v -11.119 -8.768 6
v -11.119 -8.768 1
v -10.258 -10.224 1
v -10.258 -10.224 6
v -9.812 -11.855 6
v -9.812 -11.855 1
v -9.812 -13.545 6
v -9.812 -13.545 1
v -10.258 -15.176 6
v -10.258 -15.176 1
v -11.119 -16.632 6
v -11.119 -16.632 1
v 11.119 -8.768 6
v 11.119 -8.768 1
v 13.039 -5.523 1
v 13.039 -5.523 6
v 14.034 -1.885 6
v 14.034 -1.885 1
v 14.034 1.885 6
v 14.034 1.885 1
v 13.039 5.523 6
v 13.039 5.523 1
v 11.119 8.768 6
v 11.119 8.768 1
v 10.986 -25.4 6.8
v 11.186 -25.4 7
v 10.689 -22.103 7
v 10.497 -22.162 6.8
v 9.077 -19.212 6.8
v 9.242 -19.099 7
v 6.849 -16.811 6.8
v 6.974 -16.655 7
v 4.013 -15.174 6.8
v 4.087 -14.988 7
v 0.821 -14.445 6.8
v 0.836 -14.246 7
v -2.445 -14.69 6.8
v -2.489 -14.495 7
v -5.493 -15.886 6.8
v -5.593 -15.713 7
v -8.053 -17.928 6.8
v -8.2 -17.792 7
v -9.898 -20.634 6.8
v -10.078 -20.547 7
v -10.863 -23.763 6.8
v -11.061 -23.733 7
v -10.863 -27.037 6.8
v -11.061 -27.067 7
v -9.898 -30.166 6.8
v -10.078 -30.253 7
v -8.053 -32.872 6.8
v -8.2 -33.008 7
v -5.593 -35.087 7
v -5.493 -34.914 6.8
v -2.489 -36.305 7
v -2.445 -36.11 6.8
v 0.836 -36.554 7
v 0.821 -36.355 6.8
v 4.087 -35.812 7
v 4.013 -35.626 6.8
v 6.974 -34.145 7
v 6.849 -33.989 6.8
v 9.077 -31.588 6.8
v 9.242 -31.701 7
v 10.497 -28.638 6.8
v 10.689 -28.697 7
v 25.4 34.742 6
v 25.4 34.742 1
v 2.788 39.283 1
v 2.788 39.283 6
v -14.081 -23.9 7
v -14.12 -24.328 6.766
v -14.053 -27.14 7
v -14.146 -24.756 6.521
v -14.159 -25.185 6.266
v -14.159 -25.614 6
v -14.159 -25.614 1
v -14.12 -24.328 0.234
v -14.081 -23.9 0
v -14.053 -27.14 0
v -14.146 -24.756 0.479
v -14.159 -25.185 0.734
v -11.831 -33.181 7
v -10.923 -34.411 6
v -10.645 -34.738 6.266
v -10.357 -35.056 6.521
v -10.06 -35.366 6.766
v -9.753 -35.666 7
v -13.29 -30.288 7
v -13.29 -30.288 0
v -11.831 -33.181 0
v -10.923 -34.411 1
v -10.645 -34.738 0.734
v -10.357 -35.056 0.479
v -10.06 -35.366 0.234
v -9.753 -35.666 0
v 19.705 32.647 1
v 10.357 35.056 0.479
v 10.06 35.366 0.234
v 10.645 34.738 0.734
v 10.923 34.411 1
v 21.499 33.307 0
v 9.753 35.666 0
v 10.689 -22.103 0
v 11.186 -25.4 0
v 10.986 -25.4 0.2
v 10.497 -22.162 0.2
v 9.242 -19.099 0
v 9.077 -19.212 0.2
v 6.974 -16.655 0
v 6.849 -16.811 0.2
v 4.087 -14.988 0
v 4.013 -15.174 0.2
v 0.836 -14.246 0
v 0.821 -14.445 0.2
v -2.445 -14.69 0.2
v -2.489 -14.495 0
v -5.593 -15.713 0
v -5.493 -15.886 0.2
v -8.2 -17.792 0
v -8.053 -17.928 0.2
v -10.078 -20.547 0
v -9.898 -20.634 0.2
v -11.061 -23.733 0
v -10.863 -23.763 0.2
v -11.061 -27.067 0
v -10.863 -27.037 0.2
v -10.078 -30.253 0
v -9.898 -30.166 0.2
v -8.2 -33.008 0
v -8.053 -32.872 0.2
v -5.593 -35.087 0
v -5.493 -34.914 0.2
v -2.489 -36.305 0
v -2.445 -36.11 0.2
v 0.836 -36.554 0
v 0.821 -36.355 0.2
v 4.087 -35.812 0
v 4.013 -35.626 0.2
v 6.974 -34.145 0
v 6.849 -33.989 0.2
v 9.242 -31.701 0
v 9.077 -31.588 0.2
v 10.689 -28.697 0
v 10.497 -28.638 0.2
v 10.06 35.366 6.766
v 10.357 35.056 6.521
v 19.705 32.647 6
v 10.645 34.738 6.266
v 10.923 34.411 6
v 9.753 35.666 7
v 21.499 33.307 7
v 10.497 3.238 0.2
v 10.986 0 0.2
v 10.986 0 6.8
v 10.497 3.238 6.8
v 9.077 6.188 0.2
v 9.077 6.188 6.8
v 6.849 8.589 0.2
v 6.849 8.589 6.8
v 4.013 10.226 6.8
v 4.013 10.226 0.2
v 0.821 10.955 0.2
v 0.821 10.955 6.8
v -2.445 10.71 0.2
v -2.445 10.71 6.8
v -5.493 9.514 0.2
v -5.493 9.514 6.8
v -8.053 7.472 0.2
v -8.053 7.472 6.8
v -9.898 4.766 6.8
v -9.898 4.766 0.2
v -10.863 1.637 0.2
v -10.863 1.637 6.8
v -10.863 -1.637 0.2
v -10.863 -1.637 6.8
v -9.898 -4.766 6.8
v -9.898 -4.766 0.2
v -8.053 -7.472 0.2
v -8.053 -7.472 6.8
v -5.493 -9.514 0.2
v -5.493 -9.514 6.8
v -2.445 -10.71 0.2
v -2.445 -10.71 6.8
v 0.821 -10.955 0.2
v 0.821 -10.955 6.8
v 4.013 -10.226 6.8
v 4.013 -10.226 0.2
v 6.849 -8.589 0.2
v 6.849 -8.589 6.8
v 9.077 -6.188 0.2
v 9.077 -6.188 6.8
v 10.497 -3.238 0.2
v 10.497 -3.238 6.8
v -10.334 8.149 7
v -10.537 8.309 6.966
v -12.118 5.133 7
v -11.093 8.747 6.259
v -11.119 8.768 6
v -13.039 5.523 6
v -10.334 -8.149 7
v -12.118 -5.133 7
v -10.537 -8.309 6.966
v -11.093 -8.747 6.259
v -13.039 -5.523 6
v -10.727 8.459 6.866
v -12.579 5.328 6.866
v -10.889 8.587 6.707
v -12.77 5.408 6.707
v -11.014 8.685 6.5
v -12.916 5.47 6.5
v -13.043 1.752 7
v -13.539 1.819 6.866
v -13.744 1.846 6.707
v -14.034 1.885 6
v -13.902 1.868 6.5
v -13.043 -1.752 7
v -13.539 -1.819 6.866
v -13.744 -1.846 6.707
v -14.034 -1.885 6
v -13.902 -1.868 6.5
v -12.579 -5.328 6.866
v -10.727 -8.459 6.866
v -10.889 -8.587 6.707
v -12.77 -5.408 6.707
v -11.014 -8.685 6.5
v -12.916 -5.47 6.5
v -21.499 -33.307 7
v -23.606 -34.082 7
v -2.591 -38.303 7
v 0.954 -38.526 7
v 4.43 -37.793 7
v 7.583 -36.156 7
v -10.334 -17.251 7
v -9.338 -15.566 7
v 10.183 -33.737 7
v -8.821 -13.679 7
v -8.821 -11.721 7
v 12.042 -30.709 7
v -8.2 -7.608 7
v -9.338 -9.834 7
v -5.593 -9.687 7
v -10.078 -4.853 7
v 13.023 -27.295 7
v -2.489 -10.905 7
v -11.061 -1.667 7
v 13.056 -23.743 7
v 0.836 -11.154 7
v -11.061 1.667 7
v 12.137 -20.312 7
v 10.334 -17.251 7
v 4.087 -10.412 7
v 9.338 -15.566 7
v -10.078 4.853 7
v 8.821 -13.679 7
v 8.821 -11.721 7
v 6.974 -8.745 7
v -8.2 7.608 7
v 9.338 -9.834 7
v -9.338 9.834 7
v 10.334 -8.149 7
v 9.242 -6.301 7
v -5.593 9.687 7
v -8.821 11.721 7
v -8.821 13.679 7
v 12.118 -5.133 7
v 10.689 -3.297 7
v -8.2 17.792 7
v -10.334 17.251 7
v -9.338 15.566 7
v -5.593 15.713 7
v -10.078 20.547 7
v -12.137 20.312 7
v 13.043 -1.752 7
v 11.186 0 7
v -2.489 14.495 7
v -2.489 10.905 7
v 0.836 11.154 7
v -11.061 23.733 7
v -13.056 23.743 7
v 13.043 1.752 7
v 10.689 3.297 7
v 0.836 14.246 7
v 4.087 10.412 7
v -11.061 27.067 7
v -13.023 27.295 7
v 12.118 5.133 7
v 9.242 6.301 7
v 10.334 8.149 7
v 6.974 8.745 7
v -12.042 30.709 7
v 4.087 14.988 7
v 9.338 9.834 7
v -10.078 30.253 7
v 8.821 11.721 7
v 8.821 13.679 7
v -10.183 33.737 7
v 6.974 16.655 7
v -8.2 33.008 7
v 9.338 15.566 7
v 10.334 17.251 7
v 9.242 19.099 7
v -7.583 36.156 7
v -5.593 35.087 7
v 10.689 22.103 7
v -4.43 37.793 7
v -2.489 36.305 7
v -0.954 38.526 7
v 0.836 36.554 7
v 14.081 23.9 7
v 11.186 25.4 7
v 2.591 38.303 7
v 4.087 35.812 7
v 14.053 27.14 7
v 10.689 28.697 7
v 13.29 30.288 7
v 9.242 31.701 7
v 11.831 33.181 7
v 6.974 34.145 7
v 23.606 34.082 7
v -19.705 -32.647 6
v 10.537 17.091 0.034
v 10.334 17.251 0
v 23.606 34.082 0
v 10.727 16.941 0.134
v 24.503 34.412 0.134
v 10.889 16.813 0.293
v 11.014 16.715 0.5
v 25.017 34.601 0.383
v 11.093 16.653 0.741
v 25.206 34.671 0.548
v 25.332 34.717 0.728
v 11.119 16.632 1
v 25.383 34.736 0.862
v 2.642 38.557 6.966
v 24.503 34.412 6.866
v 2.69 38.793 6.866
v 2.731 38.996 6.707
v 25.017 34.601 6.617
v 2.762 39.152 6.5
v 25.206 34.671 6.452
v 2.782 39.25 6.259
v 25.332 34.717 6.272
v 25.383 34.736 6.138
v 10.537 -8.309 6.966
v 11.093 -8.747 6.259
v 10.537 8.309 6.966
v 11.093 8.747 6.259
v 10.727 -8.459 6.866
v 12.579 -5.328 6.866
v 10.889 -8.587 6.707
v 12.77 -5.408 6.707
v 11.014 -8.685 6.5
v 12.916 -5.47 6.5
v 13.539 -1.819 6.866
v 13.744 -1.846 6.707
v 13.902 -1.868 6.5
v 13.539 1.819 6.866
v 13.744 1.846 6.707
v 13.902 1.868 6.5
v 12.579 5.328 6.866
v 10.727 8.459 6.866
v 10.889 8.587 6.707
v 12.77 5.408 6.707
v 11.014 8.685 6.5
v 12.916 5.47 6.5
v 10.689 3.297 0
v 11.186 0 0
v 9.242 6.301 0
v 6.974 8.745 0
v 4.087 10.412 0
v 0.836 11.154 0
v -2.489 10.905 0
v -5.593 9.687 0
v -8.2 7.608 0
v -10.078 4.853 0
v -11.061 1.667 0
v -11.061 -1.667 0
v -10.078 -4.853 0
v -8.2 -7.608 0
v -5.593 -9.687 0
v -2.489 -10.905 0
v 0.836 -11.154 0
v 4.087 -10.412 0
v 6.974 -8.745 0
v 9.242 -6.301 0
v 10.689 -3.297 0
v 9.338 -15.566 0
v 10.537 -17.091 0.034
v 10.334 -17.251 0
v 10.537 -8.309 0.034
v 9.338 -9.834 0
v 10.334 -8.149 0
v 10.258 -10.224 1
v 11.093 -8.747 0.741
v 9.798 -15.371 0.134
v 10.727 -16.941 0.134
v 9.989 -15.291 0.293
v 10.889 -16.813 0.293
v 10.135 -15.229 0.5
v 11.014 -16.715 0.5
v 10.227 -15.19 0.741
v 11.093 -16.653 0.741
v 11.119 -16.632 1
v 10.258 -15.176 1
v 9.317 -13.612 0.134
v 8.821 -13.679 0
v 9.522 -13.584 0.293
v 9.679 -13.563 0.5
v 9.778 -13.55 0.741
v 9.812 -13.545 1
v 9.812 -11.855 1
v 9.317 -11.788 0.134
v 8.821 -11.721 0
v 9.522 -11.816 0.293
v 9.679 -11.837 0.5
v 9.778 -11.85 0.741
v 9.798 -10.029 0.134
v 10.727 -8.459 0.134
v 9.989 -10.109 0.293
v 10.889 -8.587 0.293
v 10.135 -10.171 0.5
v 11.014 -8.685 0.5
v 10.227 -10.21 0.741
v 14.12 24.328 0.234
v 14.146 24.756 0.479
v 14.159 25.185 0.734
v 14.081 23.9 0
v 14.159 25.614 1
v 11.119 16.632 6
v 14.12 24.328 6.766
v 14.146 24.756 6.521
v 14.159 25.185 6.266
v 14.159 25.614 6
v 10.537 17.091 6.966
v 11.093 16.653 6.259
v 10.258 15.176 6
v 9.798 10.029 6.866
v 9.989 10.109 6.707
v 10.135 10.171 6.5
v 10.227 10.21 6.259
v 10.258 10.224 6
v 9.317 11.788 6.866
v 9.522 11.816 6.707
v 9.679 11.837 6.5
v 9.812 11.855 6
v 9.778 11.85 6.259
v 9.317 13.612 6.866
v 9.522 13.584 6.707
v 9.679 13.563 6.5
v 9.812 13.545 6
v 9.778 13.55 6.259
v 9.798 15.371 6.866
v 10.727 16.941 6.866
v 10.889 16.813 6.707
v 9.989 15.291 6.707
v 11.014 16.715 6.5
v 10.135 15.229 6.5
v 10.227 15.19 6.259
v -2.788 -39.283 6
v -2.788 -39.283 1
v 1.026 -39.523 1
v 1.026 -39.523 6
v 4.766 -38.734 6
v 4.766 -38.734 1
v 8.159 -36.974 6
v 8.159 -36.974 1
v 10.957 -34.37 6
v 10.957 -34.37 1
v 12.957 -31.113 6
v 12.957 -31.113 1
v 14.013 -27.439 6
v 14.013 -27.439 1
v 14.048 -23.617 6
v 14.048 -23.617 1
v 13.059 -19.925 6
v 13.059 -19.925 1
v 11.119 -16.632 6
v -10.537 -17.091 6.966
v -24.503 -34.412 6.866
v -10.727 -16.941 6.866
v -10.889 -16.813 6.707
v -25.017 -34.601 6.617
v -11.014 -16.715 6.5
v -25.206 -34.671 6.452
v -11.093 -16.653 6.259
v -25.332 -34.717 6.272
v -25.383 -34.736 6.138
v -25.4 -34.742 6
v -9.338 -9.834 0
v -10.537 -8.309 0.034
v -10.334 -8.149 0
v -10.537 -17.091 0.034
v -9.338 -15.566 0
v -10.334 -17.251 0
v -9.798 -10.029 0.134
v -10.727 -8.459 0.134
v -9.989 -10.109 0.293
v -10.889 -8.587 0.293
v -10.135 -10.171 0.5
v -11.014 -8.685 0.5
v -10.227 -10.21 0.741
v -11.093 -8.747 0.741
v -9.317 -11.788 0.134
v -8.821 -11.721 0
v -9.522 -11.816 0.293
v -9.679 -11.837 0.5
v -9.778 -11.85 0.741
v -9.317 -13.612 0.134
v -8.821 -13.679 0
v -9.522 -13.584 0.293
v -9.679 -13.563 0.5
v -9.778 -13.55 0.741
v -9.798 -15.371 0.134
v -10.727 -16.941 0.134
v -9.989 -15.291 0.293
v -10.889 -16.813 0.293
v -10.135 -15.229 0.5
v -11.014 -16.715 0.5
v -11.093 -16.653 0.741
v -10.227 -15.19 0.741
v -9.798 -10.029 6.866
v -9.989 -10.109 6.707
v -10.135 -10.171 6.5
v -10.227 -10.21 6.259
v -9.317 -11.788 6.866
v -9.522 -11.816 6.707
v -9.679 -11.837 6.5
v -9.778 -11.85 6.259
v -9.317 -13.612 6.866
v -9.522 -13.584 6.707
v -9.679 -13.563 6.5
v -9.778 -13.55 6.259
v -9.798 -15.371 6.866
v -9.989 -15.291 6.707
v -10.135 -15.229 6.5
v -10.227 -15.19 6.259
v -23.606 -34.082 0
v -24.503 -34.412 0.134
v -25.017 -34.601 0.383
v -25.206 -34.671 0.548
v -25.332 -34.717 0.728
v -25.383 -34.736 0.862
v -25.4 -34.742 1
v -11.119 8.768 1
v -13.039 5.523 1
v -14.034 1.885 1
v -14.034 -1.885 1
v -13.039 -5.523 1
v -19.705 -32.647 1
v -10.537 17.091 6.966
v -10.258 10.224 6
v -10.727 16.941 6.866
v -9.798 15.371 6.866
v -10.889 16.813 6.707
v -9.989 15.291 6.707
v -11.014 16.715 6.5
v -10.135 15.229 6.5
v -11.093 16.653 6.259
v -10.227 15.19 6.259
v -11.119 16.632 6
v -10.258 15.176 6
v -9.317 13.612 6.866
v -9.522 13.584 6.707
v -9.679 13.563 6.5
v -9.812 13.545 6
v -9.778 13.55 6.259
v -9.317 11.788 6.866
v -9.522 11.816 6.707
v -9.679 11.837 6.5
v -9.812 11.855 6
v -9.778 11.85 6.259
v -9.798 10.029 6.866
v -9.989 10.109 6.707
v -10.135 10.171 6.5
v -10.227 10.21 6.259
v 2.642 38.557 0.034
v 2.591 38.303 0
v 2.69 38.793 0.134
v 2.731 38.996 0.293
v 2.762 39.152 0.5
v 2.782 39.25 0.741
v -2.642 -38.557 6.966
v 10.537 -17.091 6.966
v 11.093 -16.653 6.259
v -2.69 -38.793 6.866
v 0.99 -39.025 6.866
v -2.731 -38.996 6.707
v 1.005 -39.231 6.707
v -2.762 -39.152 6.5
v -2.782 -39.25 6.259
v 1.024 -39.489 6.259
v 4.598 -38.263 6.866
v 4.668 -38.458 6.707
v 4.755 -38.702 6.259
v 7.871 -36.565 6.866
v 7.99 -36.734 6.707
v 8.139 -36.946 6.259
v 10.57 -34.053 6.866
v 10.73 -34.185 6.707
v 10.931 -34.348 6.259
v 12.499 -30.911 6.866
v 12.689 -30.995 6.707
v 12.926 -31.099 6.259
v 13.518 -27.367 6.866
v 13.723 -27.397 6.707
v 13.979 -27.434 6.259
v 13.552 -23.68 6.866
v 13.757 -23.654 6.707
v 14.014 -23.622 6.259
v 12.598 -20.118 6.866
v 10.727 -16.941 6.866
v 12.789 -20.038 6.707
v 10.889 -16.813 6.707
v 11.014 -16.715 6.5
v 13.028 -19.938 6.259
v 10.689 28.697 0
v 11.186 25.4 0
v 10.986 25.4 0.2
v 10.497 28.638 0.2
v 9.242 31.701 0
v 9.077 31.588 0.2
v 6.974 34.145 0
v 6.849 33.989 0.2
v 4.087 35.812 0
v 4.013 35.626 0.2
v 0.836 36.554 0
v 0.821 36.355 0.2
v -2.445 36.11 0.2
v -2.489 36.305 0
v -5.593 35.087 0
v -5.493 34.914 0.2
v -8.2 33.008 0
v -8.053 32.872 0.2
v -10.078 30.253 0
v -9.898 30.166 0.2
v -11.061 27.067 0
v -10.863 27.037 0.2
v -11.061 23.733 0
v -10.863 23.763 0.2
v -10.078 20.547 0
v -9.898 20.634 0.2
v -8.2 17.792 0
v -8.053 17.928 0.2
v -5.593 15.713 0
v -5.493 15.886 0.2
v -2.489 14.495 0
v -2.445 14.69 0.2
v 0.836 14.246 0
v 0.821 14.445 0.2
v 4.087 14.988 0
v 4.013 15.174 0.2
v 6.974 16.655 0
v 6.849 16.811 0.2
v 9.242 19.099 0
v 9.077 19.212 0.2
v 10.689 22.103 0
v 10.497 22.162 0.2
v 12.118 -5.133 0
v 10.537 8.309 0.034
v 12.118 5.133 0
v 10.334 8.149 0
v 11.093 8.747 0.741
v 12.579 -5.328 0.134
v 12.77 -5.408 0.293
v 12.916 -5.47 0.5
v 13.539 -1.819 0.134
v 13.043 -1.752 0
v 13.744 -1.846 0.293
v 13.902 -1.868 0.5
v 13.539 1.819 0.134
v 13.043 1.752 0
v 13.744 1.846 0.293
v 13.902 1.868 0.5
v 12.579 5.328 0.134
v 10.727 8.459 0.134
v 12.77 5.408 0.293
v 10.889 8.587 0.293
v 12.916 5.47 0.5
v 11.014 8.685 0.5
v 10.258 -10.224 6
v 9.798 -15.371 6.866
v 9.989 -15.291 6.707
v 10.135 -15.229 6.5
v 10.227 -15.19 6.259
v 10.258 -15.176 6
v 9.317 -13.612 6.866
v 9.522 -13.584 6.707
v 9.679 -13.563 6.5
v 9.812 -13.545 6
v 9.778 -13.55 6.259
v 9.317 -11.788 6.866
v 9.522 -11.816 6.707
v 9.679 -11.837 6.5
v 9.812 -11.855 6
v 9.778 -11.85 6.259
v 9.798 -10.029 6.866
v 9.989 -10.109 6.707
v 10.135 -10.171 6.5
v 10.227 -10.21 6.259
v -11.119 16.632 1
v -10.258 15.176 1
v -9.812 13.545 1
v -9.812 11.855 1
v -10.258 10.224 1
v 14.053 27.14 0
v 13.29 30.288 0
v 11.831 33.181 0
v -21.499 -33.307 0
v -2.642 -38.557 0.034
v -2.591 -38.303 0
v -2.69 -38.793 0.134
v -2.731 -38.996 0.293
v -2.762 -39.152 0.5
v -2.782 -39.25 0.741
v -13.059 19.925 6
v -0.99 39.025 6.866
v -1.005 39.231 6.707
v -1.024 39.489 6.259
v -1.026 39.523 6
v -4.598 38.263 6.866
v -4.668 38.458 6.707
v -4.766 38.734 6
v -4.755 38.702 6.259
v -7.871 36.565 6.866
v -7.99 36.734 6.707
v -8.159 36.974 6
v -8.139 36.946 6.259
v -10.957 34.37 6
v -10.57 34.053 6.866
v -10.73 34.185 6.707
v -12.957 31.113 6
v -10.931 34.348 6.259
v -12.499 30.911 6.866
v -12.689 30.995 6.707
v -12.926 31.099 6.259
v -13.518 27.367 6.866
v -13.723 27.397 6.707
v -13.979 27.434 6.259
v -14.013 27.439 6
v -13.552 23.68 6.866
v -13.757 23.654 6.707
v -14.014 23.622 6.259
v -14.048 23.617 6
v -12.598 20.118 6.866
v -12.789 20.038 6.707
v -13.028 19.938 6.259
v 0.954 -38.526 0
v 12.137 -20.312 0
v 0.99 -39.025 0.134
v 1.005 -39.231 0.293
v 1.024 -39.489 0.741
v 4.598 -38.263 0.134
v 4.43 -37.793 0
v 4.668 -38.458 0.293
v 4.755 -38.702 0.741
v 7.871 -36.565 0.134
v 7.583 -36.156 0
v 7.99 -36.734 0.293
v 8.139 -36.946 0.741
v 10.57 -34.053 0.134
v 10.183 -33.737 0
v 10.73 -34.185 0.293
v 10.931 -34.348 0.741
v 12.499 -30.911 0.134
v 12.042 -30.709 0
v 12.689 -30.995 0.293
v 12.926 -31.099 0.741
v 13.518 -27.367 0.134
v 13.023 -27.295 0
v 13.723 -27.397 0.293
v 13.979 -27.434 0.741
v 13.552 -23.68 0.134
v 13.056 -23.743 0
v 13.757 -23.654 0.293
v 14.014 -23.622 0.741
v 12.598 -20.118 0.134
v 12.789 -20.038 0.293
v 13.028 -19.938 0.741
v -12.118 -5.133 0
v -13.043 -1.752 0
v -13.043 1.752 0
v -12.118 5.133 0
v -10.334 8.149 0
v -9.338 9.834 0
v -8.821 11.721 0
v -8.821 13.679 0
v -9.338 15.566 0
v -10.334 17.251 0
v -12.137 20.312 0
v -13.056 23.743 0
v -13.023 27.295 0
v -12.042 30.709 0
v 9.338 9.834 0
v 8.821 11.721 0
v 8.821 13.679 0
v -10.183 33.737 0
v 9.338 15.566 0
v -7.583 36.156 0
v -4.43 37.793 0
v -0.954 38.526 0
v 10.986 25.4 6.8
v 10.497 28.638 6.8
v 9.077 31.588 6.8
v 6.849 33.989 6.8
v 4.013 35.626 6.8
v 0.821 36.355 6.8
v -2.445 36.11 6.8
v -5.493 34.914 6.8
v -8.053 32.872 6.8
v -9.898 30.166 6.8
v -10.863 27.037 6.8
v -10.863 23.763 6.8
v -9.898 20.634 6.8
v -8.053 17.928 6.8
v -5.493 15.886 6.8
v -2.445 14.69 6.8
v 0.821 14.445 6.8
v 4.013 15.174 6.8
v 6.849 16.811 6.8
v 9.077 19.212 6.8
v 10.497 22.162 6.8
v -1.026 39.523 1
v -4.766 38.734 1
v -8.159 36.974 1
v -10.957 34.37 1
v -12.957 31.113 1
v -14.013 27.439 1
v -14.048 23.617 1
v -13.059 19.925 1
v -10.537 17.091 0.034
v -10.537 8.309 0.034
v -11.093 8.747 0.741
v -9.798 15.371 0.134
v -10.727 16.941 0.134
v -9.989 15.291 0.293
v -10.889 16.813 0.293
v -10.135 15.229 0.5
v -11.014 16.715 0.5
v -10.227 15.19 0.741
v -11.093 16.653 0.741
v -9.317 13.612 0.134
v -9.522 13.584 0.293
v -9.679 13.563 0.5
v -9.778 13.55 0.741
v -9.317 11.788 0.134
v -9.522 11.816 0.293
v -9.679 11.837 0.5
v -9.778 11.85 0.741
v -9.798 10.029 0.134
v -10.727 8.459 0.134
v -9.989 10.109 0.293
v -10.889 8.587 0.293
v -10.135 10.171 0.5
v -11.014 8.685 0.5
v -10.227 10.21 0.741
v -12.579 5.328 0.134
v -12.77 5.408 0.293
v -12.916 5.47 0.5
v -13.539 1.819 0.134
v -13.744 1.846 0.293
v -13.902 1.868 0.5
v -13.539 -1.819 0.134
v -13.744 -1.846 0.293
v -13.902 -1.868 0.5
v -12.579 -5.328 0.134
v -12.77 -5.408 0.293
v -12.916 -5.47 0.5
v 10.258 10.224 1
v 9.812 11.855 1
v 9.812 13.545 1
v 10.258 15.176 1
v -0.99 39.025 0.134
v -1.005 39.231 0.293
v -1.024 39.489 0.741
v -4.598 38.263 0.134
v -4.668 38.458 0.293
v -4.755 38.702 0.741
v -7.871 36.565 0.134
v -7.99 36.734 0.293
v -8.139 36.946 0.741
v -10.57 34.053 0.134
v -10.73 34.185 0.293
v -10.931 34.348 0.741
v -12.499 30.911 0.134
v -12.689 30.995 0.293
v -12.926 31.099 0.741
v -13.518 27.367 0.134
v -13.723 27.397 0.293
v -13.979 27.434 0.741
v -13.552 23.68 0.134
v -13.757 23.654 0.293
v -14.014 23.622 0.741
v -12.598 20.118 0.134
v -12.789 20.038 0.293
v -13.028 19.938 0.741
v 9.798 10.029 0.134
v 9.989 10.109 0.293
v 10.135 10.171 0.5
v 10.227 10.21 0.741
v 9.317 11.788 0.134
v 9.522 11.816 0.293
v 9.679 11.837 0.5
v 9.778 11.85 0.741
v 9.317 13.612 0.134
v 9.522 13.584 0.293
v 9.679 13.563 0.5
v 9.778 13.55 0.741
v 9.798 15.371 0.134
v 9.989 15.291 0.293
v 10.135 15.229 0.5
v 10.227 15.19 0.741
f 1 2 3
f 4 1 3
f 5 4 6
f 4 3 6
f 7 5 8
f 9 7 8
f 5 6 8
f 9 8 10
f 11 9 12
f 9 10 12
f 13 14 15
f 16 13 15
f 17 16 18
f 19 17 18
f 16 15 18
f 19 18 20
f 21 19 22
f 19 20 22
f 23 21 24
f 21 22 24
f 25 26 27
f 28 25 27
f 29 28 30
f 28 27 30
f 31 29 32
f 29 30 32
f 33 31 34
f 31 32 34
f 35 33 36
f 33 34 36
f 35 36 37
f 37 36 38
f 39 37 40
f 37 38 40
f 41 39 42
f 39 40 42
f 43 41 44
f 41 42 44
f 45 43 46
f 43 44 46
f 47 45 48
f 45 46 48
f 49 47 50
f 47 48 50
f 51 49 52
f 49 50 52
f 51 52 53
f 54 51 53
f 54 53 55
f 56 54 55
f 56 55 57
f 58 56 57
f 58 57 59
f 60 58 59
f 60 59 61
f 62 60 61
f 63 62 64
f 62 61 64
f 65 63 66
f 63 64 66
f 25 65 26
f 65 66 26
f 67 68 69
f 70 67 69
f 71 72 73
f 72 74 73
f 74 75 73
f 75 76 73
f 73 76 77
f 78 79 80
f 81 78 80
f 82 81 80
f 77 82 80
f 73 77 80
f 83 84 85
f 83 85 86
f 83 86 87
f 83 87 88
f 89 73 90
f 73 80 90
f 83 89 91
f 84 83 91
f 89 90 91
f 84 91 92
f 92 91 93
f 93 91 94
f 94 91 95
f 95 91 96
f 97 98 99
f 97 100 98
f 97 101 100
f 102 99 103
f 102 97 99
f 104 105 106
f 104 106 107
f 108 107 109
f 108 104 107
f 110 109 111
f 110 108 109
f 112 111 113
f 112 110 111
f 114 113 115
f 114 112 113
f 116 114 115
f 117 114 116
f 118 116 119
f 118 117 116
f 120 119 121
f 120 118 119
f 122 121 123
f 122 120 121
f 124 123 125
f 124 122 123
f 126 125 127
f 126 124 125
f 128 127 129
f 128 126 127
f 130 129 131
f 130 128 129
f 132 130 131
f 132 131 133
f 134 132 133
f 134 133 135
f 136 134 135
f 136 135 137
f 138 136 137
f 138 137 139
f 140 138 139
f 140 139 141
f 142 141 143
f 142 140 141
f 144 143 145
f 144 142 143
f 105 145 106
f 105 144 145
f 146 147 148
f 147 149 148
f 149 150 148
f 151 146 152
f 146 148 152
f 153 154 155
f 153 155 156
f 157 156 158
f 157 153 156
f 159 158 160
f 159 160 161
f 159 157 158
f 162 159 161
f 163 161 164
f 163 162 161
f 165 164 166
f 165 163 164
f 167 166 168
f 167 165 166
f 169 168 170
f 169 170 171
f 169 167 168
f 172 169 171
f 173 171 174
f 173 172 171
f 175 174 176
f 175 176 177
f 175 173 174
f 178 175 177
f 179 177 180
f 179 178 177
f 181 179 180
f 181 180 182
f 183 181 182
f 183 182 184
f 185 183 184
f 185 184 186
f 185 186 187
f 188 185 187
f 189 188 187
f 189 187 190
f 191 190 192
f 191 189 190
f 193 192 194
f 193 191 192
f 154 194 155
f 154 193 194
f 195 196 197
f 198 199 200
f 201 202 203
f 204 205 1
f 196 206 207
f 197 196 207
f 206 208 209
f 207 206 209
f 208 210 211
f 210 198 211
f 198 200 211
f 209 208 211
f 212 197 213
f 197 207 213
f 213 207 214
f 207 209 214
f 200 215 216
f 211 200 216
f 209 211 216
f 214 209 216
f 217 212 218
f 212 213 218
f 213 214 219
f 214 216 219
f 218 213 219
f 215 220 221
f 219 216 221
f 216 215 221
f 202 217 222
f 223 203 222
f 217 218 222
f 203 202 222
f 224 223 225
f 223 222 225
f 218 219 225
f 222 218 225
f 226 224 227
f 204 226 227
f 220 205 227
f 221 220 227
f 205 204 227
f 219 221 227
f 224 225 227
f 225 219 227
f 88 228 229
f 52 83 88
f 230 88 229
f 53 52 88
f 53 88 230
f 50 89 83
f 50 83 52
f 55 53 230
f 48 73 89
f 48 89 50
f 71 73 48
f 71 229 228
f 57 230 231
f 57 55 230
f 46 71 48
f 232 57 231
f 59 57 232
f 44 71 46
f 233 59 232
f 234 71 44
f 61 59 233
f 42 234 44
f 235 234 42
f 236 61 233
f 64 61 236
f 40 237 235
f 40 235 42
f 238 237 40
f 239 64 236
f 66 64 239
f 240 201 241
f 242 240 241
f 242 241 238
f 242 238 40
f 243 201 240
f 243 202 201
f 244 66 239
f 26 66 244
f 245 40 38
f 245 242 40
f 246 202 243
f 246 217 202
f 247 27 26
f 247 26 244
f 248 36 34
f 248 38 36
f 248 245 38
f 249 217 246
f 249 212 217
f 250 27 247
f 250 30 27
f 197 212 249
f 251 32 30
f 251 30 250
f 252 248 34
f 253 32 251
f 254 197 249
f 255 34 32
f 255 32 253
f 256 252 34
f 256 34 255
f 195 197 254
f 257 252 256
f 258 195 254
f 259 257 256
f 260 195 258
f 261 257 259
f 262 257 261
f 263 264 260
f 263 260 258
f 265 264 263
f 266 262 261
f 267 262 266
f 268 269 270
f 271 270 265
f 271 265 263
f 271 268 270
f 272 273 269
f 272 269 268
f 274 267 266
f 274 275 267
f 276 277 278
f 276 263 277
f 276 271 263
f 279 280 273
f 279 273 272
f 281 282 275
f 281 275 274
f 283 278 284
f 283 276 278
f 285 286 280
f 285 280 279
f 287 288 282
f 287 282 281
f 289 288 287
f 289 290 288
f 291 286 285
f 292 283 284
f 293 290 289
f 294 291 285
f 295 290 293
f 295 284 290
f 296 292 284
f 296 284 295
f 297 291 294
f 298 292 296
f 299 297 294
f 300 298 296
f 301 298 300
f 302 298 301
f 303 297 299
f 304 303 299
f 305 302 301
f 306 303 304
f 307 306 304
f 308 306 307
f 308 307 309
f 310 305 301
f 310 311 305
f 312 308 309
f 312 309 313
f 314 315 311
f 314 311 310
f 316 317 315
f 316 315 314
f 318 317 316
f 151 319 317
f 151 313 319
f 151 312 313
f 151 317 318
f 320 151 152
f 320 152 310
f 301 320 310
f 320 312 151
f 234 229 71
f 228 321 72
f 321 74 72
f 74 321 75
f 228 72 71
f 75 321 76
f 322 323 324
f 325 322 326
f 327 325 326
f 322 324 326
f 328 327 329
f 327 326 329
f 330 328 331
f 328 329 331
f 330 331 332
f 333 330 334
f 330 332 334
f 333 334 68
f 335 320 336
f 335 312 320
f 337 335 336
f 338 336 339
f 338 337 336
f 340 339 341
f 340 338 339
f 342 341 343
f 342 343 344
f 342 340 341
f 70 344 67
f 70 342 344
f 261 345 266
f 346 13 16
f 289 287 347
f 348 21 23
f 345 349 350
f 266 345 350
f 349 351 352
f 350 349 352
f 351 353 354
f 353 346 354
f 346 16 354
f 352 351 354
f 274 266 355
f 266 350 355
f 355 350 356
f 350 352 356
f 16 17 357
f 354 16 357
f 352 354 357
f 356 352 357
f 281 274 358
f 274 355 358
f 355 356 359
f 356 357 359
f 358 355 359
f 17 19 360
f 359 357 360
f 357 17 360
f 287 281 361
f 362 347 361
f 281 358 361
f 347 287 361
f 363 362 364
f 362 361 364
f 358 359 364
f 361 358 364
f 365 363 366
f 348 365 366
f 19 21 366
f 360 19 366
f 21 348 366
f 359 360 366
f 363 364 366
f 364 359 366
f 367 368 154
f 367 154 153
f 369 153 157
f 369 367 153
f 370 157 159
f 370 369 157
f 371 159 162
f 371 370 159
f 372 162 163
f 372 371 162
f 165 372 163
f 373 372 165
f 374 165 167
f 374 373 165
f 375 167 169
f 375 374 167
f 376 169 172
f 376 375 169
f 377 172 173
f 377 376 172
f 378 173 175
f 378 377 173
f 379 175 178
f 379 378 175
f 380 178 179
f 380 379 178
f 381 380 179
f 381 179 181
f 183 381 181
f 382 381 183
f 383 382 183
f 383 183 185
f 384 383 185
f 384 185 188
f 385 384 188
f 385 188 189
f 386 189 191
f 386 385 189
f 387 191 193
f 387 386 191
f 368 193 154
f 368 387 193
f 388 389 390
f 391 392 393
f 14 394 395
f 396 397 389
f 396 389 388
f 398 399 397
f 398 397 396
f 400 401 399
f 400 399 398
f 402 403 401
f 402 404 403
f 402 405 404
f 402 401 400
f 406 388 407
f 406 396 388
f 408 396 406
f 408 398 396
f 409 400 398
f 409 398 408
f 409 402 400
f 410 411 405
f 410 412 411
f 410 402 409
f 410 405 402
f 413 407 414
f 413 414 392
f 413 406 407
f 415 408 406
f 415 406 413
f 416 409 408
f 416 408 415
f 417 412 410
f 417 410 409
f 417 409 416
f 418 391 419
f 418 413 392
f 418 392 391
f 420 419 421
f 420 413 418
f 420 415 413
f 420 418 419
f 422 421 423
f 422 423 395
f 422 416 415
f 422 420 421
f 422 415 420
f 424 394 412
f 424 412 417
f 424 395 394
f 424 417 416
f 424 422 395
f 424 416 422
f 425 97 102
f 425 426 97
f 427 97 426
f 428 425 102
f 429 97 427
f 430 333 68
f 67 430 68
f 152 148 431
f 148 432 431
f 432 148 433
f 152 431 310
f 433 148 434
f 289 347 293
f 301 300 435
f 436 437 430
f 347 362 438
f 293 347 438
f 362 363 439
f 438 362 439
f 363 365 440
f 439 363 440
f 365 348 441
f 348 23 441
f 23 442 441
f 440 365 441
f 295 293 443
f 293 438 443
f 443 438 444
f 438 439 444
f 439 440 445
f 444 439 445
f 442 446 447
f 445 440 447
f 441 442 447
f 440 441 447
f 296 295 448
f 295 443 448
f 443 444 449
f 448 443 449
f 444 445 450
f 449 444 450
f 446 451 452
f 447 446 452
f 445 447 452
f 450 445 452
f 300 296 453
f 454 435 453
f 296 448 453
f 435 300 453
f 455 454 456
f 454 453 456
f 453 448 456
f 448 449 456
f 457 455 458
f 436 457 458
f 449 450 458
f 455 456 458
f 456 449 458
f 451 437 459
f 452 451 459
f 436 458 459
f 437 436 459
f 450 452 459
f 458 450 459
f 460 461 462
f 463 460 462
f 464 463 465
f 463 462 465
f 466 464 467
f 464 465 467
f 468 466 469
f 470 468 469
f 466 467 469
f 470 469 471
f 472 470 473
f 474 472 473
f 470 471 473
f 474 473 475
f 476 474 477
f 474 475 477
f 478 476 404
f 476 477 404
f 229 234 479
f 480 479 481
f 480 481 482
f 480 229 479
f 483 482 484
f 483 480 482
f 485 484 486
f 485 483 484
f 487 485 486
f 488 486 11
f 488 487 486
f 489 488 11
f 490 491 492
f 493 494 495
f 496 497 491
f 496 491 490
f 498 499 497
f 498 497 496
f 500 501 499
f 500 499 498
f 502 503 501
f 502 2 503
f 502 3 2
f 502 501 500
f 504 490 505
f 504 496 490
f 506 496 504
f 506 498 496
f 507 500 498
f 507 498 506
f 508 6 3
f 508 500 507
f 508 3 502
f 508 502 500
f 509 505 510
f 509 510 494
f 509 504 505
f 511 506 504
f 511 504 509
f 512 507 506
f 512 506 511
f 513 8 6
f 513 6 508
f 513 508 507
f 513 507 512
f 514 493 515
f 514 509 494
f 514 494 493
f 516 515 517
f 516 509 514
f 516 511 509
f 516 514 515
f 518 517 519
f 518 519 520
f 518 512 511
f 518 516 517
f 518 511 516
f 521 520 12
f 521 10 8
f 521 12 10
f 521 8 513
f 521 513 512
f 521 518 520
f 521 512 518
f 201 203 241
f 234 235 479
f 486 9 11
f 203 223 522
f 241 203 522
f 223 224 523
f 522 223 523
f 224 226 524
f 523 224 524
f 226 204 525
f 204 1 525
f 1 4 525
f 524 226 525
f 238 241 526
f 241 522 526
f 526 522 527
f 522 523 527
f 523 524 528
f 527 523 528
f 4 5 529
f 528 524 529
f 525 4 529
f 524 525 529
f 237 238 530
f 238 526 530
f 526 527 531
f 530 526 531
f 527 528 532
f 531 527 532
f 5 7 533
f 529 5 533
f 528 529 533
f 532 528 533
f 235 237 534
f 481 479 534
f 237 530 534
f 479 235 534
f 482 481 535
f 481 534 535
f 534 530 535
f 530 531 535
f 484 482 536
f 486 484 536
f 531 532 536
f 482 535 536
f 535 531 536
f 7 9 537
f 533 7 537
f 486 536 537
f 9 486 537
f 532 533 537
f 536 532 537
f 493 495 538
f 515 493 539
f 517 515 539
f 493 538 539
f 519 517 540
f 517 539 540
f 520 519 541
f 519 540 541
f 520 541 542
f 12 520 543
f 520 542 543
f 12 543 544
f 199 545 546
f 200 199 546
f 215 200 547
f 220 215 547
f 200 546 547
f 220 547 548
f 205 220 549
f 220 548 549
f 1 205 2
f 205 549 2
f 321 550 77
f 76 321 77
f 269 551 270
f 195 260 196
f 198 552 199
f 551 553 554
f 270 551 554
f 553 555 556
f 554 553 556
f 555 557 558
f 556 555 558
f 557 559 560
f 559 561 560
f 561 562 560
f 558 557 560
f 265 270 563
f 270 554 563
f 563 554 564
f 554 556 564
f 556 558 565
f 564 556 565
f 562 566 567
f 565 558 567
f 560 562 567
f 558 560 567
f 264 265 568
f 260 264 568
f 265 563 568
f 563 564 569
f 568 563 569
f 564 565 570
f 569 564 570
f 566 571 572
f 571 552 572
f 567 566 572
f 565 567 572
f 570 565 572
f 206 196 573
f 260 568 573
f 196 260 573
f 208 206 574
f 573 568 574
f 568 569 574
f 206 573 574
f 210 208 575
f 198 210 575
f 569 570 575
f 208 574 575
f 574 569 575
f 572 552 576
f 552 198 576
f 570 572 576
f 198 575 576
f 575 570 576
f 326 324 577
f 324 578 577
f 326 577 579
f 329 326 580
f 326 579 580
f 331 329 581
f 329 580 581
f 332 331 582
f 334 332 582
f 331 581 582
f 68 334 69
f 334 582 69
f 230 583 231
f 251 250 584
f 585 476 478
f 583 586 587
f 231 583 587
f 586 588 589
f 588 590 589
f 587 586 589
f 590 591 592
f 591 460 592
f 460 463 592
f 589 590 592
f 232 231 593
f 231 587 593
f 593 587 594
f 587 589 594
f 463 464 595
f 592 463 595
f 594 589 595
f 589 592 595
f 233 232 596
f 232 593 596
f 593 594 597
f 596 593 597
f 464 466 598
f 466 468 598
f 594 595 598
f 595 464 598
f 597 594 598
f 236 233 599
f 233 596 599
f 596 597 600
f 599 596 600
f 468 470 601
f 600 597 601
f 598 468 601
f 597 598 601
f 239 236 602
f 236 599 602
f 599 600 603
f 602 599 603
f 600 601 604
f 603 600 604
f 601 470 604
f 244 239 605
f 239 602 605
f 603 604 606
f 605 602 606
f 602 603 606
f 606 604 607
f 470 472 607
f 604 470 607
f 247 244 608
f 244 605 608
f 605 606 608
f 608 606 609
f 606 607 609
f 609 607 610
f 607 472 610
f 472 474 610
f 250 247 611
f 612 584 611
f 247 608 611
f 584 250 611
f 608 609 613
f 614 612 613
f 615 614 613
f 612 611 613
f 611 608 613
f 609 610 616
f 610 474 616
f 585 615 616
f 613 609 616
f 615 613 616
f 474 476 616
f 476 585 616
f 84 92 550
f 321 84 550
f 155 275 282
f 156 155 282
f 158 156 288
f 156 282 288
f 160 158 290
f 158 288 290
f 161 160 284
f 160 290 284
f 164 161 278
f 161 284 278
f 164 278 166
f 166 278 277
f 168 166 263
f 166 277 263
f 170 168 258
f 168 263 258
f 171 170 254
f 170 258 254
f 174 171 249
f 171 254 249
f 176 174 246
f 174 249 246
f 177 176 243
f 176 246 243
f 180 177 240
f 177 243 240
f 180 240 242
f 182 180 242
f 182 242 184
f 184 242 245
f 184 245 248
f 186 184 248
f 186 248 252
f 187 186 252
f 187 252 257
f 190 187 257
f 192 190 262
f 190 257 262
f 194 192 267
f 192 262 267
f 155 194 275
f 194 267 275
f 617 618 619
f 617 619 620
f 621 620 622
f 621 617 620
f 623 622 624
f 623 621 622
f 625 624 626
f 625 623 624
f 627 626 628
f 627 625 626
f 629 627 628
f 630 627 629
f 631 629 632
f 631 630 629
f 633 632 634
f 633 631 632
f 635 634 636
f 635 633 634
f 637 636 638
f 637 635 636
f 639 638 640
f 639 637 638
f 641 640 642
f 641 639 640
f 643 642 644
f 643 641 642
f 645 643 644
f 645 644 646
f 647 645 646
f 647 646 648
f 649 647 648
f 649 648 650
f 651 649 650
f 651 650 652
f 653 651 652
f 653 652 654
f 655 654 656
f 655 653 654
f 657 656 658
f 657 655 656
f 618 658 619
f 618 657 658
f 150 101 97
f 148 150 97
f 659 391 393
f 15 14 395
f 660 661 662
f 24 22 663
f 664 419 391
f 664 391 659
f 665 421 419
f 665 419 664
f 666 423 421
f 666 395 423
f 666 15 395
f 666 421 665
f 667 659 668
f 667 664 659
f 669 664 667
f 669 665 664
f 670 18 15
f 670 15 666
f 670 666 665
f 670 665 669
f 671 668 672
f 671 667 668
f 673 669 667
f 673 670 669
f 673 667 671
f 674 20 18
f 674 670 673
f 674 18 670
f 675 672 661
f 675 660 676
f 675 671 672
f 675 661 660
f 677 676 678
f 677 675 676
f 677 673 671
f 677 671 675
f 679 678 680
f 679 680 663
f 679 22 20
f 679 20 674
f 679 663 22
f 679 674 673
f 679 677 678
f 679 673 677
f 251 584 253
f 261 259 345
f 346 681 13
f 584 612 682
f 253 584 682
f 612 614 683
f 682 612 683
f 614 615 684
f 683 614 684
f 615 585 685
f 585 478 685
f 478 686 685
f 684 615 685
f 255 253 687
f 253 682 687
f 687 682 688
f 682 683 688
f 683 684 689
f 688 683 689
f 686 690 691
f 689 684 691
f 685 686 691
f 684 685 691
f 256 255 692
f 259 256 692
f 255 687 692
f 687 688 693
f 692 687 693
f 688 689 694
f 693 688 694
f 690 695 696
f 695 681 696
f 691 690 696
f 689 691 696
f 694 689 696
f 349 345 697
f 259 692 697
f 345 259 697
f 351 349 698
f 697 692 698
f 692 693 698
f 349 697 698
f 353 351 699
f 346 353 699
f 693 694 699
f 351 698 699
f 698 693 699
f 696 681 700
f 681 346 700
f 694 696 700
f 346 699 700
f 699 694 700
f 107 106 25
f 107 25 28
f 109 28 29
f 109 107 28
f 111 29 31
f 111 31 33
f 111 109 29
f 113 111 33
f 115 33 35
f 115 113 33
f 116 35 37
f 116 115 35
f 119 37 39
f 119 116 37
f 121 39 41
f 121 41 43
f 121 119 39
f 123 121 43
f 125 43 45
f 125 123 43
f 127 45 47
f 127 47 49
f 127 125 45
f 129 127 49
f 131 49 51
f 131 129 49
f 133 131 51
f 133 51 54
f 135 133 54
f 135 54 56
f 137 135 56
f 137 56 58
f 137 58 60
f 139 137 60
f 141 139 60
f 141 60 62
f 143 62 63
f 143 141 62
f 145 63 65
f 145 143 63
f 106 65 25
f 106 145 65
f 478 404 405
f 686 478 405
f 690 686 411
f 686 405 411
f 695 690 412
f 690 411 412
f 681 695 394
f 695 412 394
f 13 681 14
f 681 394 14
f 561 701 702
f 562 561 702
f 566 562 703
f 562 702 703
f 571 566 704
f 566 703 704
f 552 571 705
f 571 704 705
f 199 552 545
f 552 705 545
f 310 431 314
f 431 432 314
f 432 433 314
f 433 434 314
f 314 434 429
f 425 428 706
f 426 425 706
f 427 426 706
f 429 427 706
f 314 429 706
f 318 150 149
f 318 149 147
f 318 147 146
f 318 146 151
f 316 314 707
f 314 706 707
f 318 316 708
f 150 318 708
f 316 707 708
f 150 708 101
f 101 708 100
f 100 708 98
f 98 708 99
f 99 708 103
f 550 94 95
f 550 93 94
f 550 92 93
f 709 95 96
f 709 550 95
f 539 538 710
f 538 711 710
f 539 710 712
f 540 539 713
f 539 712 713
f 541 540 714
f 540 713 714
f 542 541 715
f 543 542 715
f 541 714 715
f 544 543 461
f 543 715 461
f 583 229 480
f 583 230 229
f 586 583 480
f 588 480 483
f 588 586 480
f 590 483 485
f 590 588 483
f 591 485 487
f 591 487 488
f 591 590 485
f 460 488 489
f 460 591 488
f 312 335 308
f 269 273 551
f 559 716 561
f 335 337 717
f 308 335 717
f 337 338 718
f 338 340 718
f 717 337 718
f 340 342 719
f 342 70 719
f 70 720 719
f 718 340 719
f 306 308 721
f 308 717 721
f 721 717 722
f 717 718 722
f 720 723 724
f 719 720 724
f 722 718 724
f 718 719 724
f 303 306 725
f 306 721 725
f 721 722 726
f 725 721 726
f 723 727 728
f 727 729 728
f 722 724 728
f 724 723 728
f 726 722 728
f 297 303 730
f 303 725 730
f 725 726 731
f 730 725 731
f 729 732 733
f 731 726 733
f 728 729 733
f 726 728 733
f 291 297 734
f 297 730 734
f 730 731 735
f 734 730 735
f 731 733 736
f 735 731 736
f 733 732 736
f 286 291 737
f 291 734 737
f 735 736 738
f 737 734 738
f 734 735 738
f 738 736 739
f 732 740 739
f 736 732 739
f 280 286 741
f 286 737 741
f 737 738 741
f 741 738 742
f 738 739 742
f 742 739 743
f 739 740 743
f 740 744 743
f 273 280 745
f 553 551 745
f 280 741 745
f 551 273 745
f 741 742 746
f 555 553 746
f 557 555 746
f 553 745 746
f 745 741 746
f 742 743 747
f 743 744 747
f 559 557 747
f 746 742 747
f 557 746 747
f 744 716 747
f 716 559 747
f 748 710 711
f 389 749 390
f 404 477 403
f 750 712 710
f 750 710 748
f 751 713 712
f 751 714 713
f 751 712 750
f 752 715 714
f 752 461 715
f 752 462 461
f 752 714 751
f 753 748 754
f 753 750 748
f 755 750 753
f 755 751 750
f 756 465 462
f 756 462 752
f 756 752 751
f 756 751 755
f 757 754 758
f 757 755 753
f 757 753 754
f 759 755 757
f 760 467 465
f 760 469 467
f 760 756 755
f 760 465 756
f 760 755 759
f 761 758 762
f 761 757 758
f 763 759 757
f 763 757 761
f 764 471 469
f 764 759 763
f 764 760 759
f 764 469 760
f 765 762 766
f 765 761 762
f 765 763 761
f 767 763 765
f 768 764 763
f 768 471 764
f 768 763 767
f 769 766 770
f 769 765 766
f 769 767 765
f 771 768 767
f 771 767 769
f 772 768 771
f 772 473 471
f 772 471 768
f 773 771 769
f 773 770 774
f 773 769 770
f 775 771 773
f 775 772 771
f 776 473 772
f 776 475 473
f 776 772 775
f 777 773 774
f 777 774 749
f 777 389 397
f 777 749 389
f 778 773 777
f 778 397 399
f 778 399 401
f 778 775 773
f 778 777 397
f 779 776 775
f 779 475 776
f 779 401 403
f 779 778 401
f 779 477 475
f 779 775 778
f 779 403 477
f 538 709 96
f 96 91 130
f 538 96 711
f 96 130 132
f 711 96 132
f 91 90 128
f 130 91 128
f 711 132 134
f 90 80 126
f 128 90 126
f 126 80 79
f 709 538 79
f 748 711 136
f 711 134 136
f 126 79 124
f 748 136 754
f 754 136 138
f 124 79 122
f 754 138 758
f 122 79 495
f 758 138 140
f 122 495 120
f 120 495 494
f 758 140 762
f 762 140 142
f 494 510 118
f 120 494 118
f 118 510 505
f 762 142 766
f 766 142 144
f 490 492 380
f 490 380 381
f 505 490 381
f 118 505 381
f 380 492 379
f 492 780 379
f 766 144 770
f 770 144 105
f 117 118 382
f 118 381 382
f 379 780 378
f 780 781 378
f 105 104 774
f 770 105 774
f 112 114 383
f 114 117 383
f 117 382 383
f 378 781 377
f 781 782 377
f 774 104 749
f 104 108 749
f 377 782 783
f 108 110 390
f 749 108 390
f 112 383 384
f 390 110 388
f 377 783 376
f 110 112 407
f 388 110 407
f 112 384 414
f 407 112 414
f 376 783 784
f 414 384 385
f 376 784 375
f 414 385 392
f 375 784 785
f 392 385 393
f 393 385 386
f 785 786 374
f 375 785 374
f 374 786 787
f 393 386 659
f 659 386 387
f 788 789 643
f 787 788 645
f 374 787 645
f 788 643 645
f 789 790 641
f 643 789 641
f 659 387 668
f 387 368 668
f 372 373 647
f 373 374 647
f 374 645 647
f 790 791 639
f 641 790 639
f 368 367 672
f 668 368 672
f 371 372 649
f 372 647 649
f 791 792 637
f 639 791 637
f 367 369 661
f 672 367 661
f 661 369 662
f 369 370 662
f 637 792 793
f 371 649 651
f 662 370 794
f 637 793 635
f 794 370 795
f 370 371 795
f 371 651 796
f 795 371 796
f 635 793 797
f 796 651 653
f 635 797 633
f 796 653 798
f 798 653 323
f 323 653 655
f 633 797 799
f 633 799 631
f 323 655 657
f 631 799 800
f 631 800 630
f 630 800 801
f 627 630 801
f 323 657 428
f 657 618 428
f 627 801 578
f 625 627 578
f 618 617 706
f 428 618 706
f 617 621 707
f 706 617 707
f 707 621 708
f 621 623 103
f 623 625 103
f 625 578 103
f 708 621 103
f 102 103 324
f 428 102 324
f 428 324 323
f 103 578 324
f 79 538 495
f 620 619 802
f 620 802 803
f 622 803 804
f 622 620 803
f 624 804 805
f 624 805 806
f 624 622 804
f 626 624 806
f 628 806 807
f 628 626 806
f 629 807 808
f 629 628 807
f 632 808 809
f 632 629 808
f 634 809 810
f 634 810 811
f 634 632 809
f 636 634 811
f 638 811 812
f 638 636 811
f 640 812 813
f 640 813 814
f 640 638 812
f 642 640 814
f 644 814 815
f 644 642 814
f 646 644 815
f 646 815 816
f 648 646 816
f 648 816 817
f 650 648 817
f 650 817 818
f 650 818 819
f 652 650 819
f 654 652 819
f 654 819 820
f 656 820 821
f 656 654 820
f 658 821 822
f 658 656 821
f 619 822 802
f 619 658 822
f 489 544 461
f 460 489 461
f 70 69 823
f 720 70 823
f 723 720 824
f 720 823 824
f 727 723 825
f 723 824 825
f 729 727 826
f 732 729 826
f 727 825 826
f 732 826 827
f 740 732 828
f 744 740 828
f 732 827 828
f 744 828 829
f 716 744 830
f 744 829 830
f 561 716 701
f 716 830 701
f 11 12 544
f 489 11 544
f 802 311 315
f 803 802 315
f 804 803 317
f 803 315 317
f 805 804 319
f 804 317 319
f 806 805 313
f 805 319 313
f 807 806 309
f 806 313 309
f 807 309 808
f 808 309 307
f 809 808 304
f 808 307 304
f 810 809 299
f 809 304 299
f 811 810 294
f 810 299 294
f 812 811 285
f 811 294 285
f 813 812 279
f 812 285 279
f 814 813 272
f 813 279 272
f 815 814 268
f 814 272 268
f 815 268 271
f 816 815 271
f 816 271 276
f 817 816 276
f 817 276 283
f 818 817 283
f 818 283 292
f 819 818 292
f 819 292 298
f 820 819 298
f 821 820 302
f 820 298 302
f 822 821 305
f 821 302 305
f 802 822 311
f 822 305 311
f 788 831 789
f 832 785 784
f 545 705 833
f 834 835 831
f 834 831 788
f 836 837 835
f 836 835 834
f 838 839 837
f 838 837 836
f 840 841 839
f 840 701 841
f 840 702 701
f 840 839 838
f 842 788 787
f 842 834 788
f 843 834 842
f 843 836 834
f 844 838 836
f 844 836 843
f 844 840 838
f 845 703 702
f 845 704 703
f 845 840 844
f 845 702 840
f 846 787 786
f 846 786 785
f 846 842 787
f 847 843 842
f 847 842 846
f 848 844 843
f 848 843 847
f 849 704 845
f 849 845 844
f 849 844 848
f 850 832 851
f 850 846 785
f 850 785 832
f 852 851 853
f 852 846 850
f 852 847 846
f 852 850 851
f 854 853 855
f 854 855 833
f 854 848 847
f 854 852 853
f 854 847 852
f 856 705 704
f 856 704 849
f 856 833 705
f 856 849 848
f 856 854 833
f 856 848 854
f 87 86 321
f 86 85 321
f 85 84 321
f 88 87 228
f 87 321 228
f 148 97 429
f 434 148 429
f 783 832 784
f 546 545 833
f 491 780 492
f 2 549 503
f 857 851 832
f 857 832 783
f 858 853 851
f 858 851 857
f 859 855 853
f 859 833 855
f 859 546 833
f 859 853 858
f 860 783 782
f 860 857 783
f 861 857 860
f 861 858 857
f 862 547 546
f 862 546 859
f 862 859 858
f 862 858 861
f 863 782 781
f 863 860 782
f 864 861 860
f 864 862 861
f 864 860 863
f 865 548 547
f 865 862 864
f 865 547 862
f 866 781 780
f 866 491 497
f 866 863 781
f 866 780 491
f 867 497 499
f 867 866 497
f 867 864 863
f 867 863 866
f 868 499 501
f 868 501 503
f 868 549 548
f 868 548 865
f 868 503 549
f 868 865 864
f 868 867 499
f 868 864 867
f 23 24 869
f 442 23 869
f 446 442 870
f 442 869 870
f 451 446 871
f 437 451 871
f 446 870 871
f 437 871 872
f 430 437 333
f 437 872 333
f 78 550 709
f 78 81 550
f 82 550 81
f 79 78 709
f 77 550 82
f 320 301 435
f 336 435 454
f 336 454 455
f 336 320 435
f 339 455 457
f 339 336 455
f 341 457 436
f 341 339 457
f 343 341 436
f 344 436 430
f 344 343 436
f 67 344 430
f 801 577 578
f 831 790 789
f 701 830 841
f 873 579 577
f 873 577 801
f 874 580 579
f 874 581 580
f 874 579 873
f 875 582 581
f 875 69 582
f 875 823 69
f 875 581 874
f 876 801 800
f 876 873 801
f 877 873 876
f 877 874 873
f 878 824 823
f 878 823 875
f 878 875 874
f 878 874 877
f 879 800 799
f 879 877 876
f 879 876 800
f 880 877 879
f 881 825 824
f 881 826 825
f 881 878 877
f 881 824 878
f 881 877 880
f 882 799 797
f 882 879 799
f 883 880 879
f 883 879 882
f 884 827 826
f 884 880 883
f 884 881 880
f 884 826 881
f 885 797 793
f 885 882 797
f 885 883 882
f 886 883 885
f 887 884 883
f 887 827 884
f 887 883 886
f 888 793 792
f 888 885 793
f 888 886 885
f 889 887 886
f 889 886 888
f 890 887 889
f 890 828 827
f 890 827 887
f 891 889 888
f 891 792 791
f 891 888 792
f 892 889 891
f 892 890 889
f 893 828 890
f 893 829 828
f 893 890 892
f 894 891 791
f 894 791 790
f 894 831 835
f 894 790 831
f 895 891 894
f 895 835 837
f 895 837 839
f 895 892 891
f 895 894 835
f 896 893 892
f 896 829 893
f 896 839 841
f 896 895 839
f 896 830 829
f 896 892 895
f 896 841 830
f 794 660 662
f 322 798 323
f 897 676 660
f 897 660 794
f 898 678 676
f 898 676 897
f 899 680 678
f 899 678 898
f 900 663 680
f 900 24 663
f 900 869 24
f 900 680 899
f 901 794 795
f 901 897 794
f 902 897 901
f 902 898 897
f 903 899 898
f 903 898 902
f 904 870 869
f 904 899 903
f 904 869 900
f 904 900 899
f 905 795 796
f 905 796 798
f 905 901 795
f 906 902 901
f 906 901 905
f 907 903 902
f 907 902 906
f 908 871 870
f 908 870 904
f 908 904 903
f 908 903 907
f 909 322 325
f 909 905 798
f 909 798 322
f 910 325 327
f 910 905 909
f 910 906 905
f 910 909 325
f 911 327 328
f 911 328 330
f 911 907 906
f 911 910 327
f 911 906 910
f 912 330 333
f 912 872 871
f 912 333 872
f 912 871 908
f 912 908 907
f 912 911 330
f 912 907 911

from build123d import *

# Parameters (mm, degrees)
F0_R     = 10.9855
F1_DEPTH = 7
F2_SIZE  = 0.2
F3_SIZE  = 1
F4_R     = 1


with BuildPart() as f1:
    # F0 (on Top) → F1 (new body)
    with BuildSketch(Plane.XY):
        with BuildLine():
            ThreePointArc((-11.119352, 16.631889), (-9.755608, 12.7), (-11.119352, 8.768111))
            ThreePointArc((-11.119352, 8.768111), (-14.1605, 0), (-11.119352, -8.768111))
            ThreePointArc((-11.119352, -8.768111), (-9.755608, -12.7), (-11.119352, -16.631889))
            Line((-11.119352, -16.631889), (-25.4, -34.742009))
            Line((-25.4, -34.742009), (-2.788271, -39.283274))
            ThreePointArc((-2.788271, -39.283274), (12.067437, -32.809232), (11.119352, -16.631889))
            ThreePointArc((11.119352, -16.631889), (9.755608, -12.7), (11.119352, -8.768111))
            ThreePointArc((11.119352, -8.768111), (14.1605, 0), (11.119352, 8.768111))
            ThreePointArc((11.119352, 8.768111), (9.755608, 12.7), (11.119352, 16.631889))
            Line((11.119352, 16.631889), (25.4, 34.742009))
            Line((25.4, 34.742009), (2.788271, 39.283274))
            ThreePointArc((2.788271, 39.283274), (-12.067437, 32.809232), (-11.119352, 16.631889))
        make_face()
        with BuildLine():
            Line((-19.704933, -32.647388), (-14.158881, -25.614117))
            ThreePointArc((-14.158881, -25.614117), (-13.290102, -30.288041), (-10.923412, -34.41104))
            Line((-10.923412, -34.41104), (-19.704933, -32.647388))
        make_face(mode=Mode.SUBTRACT)
        with Locations((0, -25.4)):
            Circle(F0_R, mode=Mode.SUBTRACT)
        Circle(F0_R, mode=Mode.SUBTRACT)
        with Locations((0, 25.4)):
            Circle(F0_R, mode=Mode.SUBTRACT)
        with BuildLine():
            Line((19.704933, 32.647388), (14.158881, 25.614117))
            ThreePointArc((14.158881, 25.614117), (13.290102, 30.288041), (10.923412, 34.41104))
            Line((10.923412, 34.41104), (19.704933, 32.647388))
        make_face(mode=Mode.SUBTRACT)
    extrude(amount=F1_DEPTH)

    # F2
    f2_edges = [f1.edges().sort_by_distance(p)[0] for p in [
        (-10.9855, 25.4, 7),
        (-10.9855, 0, 7),
        (-10.9855, -25.4, 7),
        (-10.9855, 25.4, 0),
        (-10.9855, 0, 0),
        (-10.9855, -25.4, 0),
    ]]
    chamfer(f2_edges, length=F2_SIZE)

    # F3
    f3_edges = [f1.edges().sort_by_distance(p)[0] for p in [
        (15.314172, 33.529214, 7),
        (16.931907, 29.130753, 7),
        (15.314172, 33.529214, 0),
        (16.931907, 29.130753, 0),
        (-16.931907, -29.130753, 7),
        (-15.314172, -33.529214, 7),
        (-16.931907, -29.130753, 0),
        (-15.314172, -33.529214, 0),
    ]]
    chamfer(f3_edges, length=F3_SIZE)

    # F4
    f4_edges = [f1.edges().sort_by_distance(p)[0] for p in [
        (-14.1605, 0, 0),
        (12.067437, -32.809232, 0),
        (-12.067437, 32.809232, 7),
        (18.259676, 25.686949, 7),
    ]]
    fillet(f4_edges, radius=F4_R)


solid = f1.part
